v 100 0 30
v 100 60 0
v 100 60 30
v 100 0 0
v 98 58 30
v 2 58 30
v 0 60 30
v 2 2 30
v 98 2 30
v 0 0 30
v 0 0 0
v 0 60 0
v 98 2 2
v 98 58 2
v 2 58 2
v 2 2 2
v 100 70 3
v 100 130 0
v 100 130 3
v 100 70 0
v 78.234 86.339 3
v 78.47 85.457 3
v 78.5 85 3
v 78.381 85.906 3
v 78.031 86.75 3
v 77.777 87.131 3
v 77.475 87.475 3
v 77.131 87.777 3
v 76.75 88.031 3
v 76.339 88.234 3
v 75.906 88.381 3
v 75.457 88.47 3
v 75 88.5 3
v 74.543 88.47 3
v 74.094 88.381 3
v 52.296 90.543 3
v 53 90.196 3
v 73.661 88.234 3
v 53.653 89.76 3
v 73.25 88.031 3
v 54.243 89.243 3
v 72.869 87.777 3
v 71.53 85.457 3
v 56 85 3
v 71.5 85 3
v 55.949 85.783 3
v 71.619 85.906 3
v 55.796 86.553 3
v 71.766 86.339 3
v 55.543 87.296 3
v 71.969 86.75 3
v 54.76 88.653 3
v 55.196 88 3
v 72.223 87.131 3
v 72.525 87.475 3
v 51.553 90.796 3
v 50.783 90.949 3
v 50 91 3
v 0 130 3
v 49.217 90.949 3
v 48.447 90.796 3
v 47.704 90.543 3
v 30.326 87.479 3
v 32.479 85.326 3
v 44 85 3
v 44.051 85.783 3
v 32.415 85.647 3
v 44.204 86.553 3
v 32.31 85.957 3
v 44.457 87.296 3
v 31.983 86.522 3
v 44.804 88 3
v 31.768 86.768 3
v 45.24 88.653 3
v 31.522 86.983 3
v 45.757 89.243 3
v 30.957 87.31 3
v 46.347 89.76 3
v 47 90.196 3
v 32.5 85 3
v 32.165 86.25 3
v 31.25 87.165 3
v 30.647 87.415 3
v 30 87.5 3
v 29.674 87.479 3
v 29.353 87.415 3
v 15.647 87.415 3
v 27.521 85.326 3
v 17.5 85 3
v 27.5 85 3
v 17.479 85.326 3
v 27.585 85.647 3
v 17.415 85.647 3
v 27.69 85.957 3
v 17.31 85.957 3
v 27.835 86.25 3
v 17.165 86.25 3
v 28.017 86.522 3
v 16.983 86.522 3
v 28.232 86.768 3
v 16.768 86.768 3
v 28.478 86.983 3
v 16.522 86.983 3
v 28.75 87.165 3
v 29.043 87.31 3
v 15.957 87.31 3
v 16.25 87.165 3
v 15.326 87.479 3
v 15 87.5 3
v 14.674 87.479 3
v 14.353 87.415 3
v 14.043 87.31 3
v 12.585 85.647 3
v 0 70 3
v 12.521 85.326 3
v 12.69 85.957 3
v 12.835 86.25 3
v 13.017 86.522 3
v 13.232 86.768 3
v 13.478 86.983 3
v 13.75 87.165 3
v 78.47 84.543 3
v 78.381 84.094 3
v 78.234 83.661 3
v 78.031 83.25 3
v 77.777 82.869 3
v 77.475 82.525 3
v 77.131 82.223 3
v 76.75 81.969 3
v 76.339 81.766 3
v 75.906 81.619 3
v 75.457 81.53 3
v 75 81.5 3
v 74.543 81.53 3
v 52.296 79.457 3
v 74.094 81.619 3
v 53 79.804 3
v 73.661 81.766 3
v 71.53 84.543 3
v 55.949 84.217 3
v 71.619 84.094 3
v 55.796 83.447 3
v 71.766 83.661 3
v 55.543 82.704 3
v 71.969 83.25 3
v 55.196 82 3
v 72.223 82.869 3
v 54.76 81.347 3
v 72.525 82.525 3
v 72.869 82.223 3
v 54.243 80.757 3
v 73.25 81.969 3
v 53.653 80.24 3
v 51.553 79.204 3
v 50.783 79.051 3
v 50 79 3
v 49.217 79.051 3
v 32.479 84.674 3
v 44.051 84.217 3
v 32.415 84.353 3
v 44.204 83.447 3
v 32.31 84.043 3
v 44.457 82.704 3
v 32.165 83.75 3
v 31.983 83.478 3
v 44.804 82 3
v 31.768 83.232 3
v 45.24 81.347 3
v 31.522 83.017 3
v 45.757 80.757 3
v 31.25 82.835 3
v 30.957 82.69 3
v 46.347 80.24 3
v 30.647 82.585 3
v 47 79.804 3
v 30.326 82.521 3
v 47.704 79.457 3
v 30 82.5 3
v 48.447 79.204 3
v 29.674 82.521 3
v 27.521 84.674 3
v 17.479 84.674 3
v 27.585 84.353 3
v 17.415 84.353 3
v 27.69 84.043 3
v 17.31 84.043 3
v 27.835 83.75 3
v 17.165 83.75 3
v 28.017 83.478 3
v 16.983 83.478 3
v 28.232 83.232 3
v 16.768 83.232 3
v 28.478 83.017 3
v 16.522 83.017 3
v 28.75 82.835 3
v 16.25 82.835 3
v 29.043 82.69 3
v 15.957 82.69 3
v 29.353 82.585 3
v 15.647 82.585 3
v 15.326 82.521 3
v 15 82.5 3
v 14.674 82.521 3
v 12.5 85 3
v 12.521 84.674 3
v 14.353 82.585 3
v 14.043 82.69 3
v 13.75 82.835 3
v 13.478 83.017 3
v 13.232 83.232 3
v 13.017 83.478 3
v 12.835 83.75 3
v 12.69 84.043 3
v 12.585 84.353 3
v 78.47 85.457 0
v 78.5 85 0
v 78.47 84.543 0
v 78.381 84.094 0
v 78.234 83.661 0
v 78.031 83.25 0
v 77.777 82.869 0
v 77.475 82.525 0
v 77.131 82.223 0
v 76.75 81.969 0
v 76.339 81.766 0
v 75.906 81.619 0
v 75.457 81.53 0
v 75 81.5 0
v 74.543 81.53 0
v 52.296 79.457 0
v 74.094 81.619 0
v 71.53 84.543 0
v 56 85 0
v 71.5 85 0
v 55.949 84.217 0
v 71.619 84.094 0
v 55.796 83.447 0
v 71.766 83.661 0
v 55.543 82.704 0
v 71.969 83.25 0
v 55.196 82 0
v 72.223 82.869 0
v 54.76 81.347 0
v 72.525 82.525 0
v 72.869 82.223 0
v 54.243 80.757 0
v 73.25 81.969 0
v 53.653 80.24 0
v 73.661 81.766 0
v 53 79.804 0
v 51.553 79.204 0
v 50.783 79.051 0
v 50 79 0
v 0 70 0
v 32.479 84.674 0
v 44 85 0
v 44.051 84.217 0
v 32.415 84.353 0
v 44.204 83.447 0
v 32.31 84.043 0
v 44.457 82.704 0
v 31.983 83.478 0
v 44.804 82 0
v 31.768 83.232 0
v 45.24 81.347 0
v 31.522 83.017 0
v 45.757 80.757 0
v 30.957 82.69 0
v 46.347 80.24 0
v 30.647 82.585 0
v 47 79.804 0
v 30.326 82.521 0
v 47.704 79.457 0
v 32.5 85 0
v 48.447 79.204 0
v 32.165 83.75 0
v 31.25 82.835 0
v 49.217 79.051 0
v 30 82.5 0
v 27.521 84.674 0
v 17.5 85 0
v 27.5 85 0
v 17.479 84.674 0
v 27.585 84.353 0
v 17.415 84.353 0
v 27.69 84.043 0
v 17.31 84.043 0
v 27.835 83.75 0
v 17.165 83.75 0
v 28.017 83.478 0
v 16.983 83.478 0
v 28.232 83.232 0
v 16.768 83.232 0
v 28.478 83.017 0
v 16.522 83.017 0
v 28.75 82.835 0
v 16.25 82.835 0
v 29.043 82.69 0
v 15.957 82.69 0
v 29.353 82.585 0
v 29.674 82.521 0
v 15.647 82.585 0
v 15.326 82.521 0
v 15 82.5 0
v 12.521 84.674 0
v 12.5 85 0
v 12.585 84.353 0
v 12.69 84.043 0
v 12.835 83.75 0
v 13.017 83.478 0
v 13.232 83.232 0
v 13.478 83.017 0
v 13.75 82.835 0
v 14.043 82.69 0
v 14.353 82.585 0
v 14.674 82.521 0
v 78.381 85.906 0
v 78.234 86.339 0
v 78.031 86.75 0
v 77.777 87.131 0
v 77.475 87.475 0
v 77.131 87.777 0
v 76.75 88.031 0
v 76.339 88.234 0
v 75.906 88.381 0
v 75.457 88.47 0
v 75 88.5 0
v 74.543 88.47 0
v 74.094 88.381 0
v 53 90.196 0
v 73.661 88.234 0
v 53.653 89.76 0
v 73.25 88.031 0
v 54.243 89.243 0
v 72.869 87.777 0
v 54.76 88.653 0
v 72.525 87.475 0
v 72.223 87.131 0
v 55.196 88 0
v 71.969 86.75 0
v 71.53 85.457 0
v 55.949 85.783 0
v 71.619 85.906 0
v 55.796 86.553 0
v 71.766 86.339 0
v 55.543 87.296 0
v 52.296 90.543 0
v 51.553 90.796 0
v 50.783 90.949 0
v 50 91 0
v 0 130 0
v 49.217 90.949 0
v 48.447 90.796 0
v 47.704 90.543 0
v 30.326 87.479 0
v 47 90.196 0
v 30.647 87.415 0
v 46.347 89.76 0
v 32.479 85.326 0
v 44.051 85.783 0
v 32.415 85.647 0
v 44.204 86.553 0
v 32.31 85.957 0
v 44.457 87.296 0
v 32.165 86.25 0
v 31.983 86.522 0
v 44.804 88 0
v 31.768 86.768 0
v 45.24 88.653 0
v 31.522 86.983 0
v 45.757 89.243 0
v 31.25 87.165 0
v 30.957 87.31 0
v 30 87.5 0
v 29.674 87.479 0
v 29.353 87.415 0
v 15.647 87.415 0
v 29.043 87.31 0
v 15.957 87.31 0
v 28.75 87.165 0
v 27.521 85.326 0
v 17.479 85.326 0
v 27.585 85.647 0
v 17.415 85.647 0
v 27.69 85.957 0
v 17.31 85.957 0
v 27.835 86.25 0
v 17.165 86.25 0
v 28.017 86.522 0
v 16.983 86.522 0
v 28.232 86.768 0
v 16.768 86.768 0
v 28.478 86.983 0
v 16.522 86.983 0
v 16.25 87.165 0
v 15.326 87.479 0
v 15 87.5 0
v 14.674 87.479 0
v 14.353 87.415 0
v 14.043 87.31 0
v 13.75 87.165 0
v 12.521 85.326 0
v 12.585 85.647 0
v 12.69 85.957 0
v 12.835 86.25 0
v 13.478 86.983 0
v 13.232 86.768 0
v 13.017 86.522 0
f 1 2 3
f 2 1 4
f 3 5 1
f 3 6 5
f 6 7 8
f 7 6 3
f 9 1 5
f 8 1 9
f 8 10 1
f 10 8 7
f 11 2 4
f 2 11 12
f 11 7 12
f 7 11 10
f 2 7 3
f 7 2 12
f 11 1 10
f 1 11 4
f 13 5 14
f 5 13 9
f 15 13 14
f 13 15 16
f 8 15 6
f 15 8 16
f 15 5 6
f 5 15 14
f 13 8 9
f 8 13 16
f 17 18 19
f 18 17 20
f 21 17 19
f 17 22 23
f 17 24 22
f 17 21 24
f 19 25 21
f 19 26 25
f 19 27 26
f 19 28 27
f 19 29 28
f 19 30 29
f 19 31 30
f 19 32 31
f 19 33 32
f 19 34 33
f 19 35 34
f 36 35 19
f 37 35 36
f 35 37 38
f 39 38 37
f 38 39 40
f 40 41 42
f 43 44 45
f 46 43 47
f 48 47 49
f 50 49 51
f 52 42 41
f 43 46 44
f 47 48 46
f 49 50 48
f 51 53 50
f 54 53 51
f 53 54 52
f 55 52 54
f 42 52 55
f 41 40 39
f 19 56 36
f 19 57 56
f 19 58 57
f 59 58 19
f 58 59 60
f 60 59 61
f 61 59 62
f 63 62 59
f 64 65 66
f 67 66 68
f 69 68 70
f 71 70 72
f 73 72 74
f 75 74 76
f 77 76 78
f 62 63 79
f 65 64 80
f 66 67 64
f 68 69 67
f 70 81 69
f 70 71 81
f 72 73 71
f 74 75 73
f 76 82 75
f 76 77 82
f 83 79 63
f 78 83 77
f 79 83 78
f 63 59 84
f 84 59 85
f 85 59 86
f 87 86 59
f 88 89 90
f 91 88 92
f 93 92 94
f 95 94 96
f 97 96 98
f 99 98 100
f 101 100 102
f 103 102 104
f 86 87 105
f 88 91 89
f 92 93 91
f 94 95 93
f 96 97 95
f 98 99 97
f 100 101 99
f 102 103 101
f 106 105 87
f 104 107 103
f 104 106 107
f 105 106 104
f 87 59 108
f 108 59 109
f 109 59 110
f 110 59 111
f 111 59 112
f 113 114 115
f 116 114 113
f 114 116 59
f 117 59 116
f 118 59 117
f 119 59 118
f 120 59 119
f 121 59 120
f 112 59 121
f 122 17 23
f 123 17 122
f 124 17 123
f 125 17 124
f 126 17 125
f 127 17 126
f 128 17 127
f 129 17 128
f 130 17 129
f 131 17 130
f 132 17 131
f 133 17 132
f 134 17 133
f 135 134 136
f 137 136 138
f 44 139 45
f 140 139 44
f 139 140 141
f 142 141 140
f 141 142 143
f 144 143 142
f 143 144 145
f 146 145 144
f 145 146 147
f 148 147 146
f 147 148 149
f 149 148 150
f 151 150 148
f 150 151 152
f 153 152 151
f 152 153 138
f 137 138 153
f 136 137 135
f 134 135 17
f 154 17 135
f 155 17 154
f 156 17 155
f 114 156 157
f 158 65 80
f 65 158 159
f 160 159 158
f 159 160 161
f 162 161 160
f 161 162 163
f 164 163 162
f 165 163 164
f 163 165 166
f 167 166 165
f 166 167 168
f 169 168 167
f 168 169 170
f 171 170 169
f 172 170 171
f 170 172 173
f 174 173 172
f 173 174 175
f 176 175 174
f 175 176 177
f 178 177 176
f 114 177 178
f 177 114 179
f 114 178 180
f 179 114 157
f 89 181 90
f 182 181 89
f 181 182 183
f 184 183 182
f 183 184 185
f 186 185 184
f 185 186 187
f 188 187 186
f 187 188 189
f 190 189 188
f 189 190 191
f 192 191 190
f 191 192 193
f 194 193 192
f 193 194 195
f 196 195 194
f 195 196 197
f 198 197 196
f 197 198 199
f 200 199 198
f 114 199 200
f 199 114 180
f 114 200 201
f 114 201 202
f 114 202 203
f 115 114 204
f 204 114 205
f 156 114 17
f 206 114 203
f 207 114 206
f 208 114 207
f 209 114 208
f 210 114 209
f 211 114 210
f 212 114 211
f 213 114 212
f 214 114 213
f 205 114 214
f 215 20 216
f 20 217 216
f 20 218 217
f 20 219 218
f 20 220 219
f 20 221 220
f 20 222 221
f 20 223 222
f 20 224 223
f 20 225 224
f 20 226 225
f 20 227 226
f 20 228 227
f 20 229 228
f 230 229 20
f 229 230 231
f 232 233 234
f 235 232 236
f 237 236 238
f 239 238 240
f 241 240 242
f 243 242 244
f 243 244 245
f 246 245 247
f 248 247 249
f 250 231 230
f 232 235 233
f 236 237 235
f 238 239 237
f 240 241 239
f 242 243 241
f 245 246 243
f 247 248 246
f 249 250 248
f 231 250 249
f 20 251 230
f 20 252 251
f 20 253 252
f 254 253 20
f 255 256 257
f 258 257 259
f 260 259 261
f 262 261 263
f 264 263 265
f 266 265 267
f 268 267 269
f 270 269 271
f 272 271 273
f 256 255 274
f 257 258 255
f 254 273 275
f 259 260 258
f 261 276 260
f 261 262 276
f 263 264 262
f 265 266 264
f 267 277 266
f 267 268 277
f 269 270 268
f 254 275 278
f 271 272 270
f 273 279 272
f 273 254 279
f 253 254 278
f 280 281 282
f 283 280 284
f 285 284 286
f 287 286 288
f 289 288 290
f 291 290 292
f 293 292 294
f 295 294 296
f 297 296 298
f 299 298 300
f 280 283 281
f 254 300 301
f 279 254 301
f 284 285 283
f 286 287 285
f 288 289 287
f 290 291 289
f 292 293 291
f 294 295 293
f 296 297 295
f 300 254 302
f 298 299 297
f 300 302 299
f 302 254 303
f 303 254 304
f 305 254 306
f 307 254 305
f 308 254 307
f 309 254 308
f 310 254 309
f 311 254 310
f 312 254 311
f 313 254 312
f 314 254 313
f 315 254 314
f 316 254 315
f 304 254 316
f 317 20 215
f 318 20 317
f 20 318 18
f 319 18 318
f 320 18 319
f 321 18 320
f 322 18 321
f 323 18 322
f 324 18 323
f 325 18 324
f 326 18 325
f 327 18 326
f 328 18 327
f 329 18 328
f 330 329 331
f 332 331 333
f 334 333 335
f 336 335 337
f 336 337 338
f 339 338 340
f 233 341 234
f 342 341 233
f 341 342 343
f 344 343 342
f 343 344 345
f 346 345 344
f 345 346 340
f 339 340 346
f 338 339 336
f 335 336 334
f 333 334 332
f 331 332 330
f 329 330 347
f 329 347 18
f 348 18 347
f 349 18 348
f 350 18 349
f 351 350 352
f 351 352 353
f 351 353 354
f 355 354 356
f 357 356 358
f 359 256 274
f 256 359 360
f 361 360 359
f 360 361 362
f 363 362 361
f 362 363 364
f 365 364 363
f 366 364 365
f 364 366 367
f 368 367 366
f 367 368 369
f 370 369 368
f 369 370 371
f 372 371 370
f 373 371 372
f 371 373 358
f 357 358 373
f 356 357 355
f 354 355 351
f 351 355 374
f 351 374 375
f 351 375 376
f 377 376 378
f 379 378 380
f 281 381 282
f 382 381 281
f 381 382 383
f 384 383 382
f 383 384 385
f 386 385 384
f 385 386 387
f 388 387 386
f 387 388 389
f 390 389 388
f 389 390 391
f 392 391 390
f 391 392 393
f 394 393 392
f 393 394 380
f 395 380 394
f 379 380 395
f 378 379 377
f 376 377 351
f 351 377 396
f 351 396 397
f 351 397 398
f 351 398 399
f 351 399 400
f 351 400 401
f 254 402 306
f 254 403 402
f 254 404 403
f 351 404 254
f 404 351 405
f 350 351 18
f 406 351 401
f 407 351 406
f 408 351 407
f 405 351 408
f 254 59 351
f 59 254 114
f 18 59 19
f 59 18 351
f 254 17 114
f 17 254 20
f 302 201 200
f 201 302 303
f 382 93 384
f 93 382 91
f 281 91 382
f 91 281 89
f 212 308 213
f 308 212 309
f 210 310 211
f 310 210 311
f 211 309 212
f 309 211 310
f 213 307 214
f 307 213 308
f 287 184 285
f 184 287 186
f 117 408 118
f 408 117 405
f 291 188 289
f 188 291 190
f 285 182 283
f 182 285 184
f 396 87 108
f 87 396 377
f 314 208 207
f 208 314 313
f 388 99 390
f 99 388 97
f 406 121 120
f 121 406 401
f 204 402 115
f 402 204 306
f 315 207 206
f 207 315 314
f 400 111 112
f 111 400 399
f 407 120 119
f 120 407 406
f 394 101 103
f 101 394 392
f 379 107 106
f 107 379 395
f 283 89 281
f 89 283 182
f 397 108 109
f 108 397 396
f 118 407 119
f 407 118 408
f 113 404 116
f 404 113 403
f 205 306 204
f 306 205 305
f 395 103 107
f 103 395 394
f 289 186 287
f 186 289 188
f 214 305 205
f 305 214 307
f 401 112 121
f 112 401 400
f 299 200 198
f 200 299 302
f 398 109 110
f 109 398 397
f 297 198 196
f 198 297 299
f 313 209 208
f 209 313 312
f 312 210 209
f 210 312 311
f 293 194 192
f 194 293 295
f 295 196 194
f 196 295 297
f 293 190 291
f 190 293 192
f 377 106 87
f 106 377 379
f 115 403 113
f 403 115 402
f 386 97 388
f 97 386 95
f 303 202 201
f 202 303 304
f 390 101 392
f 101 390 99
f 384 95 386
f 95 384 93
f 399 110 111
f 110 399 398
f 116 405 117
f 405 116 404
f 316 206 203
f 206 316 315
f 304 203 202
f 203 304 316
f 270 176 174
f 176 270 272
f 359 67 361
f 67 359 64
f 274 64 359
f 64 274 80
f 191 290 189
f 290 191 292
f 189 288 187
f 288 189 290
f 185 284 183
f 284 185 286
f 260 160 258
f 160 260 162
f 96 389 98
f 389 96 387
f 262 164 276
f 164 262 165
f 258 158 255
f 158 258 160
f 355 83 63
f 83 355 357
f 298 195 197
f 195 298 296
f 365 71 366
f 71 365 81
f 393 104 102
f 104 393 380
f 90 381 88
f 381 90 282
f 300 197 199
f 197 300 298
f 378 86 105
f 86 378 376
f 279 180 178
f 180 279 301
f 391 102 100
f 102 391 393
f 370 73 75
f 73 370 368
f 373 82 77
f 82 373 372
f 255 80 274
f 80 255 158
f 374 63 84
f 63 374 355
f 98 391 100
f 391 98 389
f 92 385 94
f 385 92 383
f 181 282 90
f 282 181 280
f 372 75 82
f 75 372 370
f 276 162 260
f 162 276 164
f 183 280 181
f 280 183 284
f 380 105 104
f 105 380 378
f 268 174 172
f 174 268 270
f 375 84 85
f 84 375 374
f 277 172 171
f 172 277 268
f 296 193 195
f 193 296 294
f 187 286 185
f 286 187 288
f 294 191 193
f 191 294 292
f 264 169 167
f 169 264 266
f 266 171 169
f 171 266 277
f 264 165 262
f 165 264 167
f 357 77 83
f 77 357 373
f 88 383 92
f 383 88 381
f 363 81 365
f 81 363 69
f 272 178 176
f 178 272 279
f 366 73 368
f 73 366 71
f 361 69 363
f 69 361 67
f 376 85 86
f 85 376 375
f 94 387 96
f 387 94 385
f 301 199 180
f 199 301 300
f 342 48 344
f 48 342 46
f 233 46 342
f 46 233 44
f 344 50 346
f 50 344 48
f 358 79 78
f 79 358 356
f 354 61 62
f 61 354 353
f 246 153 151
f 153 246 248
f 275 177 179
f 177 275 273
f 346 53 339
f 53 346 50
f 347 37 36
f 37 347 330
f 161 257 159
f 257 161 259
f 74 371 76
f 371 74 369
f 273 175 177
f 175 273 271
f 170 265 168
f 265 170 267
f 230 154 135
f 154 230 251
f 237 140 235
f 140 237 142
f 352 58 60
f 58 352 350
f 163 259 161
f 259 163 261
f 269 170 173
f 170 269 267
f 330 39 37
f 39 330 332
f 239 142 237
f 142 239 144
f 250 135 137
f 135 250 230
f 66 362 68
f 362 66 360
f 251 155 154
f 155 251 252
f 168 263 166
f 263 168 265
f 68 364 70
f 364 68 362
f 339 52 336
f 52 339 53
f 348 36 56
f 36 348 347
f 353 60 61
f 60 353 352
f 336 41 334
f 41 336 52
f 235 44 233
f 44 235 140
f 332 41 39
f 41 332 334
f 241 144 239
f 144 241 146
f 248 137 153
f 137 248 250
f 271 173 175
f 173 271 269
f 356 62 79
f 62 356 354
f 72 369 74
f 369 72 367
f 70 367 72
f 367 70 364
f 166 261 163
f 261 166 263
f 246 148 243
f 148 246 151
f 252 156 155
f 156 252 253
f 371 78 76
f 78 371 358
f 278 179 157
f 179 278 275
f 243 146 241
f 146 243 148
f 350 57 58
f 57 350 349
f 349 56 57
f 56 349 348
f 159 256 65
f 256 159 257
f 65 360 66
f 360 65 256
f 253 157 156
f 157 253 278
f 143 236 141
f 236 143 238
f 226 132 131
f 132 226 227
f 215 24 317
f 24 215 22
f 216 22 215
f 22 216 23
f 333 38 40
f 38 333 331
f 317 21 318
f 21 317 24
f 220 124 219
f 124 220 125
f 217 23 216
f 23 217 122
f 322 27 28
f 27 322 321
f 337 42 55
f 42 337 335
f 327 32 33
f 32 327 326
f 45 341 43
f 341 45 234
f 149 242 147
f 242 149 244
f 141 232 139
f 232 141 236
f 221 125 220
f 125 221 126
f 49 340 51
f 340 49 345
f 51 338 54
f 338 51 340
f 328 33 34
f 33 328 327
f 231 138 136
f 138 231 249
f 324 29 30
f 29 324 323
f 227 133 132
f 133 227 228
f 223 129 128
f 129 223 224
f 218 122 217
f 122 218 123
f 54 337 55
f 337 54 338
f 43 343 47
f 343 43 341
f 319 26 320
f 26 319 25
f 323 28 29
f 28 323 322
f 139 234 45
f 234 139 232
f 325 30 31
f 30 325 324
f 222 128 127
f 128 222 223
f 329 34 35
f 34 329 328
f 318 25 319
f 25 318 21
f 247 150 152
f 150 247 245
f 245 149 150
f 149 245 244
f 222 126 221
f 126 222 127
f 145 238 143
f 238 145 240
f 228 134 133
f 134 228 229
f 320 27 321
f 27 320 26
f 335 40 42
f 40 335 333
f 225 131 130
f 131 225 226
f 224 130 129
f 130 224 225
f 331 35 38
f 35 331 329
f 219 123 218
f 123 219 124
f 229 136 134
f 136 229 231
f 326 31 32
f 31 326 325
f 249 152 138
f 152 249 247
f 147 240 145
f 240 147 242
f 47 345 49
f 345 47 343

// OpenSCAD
// ESPHome Boiler Monitor enclosure - printable concept
// Units: mm
$fn = 48;
box_w = 100;
box_h = 60;
box_d = 30;
wall = 2;

module base_box() {
  difference() {
    cube([box_w, box_h, box_d]);
    translate([wall, wall, wall])
      cube([box_w-2*wall, box_h-2*wall, box_d]);
  }
}

module lid() {
  difference() {
    cube([box_w, box_h, 3]);
    translate([15, 15, -1]) cylinder(h=6, d=5);   // red LED
    translate([30, 15, -1]) cylinder(h=6, d=5);   // green LED
    translate([50, 15, -1]) cylinder(h=6, d=12);  // buzzer
    translate([75, 15, -1]) cylinder(h=6, d=7);   // mute button
  }
}

base_box();
translate([0, 70, 0]) lid();
